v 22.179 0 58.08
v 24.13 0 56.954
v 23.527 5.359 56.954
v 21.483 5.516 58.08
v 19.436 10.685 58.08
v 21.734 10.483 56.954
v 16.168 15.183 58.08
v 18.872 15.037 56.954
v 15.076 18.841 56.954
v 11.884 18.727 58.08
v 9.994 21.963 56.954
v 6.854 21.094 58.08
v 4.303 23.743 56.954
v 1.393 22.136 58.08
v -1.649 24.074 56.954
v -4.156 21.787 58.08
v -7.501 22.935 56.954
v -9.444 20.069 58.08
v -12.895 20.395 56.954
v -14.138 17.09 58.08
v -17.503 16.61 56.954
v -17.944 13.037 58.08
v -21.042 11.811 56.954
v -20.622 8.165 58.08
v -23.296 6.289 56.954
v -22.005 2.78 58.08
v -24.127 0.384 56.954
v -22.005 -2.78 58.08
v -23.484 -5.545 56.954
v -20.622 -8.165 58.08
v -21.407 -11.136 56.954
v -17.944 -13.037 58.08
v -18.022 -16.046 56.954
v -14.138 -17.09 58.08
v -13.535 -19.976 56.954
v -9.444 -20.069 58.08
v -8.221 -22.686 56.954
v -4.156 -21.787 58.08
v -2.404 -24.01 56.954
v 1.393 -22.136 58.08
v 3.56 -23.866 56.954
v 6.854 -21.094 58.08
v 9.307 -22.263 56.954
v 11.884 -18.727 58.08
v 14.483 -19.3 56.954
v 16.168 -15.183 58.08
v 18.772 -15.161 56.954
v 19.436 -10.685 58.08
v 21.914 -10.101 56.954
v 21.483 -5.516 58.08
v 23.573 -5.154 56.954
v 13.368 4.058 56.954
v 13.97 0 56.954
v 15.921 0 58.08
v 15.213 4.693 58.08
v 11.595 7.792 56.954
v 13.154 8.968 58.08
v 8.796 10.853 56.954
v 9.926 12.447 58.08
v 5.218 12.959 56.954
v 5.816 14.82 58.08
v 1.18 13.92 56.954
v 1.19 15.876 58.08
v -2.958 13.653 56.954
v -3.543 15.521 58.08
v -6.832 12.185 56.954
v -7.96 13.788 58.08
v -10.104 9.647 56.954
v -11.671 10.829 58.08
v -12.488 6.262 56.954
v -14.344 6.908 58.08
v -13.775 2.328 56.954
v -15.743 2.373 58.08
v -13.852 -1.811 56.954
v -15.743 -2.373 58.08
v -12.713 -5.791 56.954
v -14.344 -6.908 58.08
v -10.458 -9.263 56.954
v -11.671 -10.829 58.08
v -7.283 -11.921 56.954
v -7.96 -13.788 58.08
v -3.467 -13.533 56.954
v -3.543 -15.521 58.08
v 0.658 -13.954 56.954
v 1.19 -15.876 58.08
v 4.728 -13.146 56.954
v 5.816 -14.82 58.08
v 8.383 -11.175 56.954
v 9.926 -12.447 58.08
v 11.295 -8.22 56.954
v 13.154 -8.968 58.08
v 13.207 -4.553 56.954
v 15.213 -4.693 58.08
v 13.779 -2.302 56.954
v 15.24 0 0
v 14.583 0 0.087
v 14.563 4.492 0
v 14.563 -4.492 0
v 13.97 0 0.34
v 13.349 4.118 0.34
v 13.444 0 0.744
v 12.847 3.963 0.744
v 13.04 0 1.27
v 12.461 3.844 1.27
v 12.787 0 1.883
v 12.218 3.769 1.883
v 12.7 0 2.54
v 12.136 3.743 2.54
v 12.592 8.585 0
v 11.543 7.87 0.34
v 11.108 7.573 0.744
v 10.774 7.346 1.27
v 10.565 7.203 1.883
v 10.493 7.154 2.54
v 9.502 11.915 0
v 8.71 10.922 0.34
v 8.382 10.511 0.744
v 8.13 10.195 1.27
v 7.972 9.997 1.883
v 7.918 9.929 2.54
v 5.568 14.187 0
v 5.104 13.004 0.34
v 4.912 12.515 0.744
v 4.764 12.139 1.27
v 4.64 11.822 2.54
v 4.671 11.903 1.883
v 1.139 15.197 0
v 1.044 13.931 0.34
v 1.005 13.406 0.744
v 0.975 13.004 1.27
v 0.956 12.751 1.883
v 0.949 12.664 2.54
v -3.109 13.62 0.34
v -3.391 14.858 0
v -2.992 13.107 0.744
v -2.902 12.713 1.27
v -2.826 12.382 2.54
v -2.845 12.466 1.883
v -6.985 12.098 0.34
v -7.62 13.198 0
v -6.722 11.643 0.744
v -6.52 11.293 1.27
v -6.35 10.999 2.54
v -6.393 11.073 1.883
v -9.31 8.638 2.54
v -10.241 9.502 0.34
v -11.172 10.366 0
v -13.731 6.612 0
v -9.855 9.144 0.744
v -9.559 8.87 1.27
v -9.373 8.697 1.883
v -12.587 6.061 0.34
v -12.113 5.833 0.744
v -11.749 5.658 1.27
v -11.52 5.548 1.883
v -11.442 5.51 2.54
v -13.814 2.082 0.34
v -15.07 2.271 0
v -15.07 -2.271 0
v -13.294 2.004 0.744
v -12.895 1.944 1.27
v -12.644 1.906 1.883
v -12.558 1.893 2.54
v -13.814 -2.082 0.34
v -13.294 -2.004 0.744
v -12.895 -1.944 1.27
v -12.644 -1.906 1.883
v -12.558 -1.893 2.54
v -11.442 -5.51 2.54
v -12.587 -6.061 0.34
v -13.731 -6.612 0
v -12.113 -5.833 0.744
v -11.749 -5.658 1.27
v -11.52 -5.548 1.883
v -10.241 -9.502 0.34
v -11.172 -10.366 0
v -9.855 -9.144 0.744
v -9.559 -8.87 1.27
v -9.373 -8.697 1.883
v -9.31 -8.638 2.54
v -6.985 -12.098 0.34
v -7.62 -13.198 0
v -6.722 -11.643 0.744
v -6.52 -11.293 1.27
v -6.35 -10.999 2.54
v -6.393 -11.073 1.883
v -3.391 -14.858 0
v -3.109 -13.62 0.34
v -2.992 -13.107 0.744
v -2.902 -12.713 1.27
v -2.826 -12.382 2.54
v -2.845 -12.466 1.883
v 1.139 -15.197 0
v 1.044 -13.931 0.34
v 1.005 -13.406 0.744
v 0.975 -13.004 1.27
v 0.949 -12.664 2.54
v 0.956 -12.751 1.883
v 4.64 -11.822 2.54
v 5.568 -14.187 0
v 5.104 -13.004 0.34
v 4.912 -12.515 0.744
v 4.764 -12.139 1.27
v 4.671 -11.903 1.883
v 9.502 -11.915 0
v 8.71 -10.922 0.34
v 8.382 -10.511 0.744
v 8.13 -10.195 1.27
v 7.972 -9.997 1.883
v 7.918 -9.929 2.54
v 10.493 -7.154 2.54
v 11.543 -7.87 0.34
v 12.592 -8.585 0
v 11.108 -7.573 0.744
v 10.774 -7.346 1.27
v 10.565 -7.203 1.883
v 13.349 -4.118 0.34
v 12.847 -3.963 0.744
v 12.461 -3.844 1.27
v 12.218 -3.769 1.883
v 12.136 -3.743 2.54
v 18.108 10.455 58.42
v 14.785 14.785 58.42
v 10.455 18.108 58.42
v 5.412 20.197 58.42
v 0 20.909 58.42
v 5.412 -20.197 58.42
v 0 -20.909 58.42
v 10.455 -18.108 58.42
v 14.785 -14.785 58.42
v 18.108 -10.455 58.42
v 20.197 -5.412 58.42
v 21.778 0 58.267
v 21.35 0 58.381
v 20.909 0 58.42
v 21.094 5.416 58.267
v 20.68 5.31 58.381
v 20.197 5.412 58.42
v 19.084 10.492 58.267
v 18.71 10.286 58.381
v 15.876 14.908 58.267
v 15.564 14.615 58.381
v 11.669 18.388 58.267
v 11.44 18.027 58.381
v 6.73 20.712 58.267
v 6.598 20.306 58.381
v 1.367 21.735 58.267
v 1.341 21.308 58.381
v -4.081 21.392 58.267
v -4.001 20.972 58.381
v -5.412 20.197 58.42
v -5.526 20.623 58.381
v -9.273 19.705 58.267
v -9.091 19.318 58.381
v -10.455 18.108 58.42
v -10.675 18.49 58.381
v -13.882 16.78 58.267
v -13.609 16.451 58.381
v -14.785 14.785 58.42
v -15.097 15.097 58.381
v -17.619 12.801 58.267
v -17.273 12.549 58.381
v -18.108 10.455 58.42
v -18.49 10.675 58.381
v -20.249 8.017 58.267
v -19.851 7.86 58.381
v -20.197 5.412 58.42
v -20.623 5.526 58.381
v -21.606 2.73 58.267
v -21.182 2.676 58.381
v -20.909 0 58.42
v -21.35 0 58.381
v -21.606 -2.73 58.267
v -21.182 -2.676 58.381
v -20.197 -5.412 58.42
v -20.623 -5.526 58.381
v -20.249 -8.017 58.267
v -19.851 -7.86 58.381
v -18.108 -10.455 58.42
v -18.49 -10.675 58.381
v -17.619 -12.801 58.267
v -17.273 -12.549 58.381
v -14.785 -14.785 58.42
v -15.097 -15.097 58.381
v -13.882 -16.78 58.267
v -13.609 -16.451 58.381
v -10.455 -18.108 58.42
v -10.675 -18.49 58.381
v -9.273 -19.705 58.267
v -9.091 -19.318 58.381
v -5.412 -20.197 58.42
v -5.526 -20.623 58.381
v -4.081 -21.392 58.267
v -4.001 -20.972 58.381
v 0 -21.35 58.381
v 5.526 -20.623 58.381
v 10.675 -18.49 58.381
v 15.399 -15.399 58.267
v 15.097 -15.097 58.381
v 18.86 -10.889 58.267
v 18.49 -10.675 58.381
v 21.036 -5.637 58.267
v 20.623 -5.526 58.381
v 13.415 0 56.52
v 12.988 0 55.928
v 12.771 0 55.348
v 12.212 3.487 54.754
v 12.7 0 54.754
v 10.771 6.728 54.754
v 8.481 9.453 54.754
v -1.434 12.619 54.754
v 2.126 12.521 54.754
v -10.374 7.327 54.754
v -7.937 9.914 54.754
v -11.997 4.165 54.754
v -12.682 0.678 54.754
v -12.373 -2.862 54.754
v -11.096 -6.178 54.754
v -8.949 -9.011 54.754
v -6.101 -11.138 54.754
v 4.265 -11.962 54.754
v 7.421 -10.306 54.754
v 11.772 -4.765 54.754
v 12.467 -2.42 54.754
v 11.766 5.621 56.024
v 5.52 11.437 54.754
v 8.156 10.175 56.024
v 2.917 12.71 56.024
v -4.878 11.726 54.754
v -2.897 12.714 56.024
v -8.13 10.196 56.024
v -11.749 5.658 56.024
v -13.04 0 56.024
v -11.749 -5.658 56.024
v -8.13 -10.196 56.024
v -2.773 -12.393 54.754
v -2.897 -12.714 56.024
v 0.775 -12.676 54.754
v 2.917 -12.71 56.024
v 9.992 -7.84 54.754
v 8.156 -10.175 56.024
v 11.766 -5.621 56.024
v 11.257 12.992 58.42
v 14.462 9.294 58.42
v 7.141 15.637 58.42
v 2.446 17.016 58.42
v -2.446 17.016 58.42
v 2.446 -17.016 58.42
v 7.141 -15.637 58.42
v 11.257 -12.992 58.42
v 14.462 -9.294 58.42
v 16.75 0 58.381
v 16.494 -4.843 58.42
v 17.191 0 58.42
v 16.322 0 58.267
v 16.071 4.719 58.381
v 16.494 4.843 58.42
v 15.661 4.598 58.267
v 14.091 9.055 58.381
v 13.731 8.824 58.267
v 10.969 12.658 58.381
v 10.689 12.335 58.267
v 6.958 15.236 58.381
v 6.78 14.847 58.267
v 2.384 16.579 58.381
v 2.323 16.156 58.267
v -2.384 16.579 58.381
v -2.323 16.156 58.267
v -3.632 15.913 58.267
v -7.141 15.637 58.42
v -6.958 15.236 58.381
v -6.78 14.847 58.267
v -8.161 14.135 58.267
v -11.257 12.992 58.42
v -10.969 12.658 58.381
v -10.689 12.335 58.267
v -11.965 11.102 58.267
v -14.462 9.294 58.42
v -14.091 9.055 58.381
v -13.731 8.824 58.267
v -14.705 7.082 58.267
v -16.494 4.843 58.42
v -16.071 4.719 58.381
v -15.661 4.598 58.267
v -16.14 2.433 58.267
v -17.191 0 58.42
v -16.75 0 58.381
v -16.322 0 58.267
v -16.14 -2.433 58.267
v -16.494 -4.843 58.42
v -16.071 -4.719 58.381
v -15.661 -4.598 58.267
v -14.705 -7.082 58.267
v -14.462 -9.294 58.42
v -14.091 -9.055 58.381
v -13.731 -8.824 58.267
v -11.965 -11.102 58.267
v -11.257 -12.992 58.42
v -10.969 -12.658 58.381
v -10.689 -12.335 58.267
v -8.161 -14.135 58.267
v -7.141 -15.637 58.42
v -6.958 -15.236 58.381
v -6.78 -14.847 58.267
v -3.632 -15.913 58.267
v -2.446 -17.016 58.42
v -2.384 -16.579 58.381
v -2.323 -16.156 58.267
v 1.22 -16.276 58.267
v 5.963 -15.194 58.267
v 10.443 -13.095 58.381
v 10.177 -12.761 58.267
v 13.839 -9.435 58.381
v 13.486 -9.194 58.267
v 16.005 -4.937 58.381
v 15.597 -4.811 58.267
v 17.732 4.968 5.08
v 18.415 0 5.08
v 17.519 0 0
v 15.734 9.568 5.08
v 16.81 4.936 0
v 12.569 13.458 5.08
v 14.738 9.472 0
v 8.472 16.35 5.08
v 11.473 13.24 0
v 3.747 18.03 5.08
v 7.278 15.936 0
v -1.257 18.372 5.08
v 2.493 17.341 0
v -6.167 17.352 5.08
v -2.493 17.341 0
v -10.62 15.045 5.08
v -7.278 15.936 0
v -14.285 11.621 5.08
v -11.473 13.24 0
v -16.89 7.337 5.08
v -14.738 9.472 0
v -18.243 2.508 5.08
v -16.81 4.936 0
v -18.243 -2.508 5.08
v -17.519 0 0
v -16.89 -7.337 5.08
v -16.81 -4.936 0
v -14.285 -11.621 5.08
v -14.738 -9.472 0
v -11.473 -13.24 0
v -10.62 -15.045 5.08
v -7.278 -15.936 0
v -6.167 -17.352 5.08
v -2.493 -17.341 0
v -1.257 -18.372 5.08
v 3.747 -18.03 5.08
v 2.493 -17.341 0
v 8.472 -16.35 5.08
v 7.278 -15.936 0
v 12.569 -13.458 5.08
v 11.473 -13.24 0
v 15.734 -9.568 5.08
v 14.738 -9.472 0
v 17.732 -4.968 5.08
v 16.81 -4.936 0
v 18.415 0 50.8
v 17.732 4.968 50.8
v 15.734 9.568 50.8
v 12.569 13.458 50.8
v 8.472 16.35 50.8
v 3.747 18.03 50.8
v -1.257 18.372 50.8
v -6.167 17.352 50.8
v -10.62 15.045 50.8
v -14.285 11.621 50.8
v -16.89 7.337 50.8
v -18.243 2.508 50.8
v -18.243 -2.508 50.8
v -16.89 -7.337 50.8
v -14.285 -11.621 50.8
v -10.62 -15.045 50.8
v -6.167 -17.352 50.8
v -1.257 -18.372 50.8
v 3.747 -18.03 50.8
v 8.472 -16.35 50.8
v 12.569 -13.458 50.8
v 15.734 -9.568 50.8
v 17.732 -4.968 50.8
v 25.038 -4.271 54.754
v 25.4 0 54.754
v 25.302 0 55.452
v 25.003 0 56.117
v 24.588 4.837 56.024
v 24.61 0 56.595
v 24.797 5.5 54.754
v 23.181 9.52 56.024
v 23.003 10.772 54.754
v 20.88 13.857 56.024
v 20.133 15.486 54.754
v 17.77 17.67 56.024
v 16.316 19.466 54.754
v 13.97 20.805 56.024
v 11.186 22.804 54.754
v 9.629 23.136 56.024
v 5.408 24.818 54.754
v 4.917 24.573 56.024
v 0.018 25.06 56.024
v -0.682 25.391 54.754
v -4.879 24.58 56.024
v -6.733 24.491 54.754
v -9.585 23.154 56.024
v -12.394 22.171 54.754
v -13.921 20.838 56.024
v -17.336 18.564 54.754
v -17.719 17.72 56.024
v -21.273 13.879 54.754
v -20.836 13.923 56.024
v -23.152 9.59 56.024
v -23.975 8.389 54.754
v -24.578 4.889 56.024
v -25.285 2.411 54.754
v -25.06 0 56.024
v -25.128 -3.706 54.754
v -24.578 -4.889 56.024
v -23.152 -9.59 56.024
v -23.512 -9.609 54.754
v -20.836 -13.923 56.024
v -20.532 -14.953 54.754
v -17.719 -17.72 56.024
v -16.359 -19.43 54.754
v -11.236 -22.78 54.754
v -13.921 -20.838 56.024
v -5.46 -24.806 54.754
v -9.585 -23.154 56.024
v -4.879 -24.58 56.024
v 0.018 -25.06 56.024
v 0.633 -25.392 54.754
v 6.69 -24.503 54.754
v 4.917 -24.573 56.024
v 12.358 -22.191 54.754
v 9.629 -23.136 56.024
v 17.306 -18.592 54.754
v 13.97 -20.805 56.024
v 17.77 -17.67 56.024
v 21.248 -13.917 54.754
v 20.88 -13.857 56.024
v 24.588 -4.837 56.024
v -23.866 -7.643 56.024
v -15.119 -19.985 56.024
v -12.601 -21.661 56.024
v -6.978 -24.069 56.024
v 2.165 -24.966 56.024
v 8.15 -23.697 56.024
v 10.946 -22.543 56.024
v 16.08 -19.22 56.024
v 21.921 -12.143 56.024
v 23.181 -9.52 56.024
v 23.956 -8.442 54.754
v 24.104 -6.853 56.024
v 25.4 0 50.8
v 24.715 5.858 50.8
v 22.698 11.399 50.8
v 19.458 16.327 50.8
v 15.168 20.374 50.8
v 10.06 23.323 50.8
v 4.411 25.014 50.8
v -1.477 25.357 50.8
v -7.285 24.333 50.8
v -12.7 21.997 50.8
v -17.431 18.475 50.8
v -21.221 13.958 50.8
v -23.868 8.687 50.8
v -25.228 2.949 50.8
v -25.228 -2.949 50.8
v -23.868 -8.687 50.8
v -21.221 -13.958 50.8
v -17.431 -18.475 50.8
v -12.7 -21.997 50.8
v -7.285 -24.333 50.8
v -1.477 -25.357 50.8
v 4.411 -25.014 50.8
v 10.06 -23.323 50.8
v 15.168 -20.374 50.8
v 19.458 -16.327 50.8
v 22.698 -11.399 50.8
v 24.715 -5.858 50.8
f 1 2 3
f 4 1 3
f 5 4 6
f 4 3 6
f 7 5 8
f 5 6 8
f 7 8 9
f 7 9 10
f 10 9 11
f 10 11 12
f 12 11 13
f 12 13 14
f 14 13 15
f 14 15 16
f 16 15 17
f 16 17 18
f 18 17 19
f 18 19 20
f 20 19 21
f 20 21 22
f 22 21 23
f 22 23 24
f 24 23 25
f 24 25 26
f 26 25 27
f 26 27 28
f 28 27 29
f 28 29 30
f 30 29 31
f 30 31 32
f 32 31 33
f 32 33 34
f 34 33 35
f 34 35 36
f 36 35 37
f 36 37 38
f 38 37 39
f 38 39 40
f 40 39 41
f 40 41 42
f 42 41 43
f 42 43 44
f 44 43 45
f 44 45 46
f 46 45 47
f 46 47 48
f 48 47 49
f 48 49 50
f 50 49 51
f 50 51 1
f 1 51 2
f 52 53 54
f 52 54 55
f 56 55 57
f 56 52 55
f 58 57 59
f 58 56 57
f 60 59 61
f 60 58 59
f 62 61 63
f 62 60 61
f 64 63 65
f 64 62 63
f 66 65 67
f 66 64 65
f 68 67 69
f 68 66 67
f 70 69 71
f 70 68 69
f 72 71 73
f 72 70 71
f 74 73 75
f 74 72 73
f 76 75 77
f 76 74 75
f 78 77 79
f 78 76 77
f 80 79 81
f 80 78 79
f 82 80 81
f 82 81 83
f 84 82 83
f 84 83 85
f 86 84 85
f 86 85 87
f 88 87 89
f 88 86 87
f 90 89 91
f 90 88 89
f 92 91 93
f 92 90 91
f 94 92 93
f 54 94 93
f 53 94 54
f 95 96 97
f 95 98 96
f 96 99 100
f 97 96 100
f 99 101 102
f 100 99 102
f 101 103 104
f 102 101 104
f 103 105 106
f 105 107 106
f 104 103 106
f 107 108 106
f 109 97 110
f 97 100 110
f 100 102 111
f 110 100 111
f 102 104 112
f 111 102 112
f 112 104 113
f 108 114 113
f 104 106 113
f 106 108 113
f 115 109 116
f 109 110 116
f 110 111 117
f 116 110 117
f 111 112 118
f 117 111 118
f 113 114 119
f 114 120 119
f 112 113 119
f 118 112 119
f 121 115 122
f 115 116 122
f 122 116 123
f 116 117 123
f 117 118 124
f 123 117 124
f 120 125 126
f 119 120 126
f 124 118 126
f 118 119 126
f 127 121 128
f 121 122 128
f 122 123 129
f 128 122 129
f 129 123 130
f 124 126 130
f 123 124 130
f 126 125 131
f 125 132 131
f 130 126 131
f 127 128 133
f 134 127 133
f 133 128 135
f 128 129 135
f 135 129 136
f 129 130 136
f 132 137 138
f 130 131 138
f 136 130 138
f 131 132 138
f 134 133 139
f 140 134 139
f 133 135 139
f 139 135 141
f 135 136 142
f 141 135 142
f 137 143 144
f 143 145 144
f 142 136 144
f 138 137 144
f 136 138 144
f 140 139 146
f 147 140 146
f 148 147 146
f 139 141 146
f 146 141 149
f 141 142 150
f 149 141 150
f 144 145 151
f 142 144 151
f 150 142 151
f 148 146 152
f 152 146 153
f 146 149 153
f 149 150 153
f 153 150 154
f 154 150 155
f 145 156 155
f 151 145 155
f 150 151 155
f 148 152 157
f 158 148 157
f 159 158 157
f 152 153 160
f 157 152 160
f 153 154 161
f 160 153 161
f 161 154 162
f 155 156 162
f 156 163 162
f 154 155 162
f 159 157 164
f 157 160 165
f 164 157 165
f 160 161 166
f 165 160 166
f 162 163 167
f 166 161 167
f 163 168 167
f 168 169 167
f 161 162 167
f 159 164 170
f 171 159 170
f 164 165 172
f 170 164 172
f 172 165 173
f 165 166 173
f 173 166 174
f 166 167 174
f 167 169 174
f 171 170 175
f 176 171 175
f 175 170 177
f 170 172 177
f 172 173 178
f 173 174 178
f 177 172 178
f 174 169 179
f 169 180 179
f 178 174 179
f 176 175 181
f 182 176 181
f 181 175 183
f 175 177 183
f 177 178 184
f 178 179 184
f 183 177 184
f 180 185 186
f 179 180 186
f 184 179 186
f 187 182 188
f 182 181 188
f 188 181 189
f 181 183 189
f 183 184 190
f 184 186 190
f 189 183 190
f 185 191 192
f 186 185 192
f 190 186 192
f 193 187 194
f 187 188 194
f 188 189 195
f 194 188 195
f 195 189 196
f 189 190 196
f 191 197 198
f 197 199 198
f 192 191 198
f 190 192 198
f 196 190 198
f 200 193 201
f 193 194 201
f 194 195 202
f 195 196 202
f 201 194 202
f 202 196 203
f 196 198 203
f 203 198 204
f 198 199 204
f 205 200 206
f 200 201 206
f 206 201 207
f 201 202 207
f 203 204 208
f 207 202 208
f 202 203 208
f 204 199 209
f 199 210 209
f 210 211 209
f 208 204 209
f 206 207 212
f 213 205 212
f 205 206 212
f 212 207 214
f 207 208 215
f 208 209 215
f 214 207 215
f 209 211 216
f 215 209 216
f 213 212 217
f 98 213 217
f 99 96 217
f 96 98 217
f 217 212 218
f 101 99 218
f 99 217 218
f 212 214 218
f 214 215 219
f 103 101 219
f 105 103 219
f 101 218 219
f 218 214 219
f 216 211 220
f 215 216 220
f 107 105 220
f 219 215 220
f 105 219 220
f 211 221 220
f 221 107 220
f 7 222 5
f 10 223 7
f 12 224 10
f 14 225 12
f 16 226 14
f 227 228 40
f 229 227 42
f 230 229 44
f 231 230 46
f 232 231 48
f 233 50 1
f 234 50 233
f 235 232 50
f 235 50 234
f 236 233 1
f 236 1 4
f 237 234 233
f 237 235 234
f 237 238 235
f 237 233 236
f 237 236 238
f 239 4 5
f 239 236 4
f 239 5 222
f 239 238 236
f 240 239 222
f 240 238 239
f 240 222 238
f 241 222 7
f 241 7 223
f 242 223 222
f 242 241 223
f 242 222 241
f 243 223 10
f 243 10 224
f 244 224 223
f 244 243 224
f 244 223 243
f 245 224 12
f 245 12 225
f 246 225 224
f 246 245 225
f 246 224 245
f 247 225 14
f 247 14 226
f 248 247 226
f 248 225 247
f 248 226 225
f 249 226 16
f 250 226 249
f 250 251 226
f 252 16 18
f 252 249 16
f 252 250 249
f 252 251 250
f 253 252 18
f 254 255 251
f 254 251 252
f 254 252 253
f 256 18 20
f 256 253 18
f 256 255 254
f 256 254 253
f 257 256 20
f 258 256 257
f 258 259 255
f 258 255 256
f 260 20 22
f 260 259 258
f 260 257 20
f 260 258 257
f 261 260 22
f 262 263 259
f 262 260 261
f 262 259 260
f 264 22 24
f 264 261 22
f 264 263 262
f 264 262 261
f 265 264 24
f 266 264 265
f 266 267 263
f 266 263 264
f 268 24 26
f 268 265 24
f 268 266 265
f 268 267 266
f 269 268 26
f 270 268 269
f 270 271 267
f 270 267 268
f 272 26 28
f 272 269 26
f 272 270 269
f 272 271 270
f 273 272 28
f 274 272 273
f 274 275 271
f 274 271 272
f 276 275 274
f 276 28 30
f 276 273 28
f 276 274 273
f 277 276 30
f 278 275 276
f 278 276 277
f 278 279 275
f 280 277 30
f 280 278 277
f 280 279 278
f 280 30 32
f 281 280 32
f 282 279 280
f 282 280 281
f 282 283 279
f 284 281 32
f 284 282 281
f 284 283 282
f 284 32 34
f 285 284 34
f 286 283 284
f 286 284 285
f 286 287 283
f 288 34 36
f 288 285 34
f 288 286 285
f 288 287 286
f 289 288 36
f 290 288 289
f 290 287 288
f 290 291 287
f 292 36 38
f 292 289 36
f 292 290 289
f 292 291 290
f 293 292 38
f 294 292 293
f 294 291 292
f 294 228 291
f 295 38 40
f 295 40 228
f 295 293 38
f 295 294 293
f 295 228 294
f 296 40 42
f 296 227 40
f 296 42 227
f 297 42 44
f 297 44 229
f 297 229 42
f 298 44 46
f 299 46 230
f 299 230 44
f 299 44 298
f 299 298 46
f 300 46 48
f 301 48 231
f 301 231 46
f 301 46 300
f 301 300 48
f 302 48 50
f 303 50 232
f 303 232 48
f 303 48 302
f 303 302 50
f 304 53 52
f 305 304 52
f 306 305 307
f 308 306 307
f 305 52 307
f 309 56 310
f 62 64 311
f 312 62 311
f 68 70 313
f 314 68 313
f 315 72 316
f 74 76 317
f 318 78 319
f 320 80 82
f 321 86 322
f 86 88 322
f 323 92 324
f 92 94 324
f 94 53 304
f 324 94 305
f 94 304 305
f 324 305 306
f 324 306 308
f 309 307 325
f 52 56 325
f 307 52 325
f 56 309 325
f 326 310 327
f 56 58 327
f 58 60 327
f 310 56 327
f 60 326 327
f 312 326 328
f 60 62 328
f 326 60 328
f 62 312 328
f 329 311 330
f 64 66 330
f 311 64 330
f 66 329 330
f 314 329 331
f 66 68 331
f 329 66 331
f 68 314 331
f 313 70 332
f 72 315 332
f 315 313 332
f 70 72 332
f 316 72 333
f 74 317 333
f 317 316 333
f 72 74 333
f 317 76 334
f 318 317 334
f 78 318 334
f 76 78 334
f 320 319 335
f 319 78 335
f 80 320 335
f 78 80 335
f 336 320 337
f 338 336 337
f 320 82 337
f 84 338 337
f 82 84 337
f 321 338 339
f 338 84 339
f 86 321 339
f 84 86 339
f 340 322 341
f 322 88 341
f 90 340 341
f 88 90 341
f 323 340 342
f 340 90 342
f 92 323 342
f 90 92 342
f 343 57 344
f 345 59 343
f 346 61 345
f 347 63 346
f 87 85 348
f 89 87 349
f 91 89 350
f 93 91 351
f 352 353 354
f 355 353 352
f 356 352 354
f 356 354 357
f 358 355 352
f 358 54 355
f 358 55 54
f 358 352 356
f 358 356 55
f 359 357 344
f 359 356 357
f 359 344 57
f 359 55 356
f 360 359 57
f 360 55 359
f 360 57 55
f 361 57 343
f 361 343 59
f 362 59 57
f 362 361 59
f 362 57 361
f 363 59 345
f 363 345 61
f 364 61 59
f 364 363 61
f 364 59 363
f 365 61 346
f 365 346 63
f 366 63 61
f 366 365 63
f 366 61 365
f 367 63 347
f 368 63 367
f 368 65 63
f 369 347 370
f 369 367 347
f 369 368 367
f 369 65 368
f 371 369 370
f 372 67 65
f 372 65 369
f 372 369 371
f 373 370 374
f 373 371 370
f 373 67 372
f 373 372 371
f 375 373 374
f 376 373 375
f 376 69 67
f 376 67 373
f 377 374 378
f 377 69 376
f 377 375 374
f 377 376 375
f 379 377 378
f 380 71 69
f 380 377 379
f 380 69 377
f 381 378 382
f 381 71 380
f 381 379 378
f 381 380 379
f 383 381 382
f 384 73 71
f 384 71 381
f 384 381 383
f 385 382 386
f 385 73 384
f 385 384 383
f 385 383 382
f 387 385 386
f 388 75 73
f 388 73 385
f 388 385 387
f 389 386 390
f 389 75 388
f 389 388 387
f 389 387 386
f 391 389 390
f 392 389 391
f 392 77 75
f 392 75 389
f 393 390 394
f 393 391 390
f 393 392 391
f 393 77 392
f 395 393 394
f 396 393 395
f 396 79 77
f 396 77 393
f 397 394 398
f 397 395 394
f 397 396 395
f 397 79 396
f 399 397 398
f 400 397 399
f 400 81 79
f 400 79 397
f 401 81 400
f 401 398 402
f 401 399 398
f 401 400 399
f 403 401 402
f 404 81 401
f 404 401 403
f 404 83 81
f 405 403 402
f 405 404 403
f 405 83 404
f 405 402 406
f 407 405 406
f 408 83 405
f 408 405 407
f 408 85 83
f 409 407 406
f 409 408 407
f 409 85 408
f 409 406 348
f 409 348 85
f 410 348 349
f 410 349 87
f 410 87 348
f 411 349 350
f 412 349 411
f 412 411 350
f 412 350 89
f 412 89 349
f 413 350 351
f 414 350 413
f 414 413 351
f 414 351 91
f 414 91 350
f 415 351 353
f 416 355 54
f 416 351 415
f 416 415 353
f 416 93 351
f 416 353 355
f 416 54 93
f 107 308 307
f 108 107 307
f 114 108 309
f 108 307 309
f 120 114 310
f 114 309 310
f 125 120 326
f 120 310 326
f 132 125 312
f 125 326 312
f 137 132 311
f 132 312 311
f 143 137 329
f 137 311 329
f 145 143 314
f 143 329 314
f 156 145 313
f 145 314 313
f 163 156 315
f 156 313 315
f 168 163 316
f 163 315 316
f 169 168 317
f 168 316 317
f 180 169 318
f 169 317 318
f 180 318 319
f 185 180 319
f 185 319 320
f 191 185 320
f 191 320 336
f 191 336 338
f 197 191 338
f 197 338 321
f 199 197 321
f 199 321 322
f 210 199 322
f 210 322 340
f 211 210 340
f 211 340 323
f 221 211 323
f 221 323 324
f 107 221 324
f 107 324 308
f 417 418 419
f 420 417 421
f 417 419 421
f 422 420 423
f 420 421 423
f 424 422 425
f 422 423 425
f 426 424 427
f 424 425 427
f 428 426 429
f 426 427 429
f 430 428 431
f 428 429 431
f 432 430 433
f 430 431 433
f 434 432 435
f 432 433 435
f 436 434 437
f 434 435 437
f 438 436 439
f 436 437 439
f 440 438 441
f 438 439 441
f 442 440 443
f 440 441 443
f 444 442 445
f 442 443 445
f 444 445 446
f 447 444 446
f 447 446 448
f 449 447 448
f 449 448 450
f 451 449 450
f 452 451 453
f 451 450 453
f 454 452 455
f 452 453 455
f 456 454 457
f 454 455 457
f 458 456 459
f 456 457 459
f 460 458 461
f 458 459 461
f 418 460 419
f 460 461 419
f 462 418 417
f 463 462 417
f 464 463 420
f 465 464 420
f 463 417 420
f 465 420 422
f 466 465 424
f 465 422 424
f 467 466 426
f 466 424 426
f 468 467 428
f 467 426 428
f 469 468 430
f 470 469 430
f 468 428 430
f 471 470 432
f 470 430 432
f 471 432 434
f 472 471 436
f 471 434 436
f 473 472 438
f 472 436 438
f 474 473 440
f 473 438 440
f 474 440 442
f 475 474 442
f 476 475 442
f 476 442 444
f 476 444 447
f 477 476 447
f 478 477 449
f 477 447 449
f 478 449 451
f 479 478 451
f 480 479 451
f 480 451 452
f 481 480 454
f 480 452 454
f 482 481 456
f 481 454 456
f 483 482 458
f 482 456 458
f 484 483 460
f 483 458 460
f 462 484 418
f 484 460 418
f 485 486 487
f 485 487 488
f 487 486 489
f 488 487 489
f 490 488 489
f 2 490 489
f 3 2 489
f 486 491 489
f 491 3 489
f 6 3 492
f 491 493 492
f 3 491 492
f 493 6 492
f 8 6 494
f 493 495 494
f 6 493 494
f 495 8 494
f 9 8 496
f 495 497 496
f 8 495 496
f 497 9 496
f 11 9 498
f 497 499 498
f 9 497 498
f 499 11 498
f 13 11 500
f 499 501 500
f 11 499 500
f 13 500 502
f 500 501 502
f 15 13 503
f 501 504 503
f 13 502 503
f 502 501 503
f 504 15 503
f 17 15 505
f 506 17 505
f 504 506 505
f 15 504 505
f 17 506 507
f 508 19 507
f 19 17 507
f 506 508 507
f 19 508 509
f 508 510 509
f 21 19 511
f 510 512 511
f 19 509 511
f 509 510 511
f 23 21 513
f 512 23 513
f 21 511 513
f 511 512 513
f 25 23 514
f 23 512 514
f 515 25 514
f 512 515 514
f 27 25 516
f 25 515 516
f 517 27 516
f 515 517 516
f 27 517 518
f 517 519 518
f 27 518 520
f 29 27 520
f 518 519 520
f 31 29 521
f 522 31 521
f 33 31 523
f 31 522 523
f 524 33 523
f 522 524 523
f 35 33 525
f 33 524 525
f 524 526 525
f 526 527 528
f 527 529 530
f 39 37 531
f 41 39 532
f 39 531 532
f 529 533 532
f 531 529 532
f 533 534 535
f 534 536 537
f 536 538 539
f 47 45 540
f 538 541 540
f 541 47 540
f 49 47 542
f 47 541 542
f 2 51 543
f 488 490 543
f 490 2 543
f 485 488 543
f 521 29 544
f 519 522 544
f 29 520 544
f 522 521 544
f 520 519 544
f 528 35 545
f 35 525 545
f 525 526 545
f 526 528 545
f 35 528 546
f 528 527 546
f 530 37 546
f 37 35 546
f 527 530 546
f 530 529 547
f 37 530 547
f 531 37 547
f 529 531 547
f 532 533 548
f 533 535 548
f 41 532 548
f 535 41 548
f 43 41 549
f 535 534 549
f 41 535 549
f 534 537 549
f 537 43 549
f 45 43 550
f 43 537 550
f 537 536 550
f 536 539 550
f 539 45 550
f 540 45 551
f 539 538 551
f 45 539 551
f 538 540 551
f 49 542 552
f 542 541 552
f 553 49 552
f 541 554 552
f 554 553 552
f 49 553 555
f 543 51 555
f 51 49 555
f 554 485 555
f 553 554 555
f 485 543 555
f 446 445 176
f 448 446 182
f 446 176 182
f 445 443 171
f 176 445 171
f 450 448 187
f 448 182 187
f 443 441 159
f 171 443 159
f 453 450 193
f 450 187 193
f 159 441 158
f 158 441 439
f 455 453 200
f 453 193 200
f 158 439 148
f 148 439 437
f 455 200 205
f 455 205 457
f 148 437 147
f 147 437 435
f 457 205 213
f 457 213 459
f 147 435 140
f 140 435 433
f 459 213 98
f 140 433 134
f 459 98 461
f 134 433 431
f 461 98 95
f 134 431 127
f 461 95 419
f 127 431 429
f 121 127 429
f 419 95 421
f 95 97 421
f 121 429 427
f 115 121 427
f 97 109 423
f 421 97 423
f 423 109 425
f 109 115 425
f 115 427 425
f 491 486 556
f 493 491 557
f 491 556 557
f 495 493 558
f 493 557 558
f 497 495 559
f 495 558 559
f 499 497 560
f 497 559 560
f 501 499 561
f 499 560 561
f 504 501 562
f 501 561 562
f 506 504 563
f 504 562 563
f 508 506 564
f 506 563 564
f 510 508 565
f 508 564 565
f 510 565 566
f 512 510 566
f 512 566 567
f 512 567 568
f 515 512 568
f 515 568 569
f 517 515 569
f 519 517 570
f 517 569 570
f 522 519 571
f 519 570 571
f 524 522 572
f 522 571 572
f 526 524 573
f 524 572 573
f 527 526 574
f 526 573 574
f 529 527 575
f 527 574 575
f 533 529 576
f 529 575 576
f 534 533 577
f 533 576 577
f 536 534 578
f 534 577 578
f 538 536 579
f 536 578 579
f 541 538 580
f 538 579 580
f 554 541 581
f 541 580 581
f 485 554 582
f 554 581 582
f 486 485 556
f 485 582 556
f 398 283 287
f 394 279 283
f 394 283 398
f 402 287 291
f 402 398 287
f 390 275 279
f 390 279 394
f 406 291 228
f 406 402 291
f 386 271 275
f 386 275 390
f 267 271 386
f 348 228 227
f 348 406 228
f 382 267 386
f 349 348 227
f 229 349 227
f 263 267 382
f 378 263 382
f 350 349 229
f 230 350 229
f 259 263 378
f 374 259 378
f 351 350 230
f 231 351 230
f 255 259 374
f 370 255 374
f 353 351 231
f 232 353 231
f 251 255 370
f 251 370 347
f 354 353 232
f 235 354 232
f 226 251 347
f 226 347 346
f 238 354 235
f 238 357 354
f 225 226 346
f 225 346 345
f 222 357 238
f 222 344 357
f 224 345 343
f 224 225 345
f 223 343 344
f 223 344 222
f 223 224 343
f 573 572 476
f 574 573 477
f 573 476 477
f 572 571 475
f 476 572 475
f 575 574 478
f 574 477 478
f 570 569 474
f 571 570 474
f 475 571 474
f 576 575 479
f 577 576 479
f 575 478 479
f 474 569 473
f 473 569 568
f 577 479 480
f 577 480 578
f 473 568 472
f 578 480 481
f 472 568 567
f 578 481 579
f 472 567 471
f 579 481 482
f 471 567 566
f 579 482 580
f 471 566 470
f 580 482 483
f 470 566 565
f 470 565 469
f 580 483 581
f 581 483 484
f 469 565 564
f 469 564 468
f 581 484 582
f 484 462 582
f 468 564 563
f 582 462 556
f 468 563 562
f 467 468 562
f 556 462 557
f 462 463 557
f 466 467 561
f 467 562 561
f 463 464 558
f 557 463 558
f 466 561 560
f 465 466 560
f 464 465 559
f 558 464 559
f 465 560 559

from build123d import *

# Parameters (mm, degrees)
F0_R     = 18.415
F1_DEPTH = 50.8
F2_R     = 25.4
F2_R_2   = 18.415
F3_DEPTH = 7.62
F4_R     = 12.7
F5_DEPTH = 58.421
F6_SIZE2 = 2.1997045256
F6_SIZE  = 3.81
F7_R     = 2.54
F8_R     = 2.54
F9_SIZE2 = 0.895741062
F9_SIZE  = 5.08


with BuildPart() as f1:
    # F0 (on Top) → F1 (new body)
    with BuildSketch(Plane.XY):
        Circle(F0_R)
    extrude(amount=F1_DEPTH)

    # F2 (on face) → F3 (join)
    with BuildSketch(Plane.XY.offset(50.8)):
        Circle(F2_R)
        Circle(F2_R_2, mode=Mode.SUBTRACT)
        Circle(F2_R_2)
    extrude(amount=F3_DEPTH)

    # F4 (on face) → F5 (cut, through all)
    with BuildSketch(Plane.XY.offset(58.42)):
        Circle(F4_R)
    extrude(amount=-F5_DEPTH, mode=Mode.SUBTRACT)

    # F6
    f6_edges = [f1.edges().sort_by_distance(p)[0] for p in [
        (-25.4, 0, 58.42),
        (-12.7, 0, 58.42),
    ]]
    f6_side = f1.faces().sort_by_distance((-24.68158, 0, 58.42))[0]
    chamfer(f6_edges, length=F6_SIZE, length2=F6_SIZE2, reference=f6_side)

    # F7
    f7_edges = [f1.edges().sort_by_distance(p)[0] for p in [
        (-16.51, 0, 58.42),
        (-21.59, 0, 58.42),
        (-25.4, 0, 56.220295),
        (-12.7, 0, 56.220295),
    ]]
    fillet(f7_edges, radius=F7_R)

    # F8
    f8_edges = [f1.edges().sort_by_distance(p)[0] for p in [
        (-12.7, 0, 0),
    ]]
    fillet(f8_edges, radius=F8_R)

    # F9
    f9_edges = [f1.edges().sort_by_distance(p)[0] for p in [
        (-18.415, 0, 0),
    ]]
    f9_side = f1.faces().sort_by_distance((-18.415, 0, 25.4))[0]
    chamfer(f9_edges, length=F9_SIZE, length2=F9_SIZE2, reference=f9_side)


solid = f1.part
